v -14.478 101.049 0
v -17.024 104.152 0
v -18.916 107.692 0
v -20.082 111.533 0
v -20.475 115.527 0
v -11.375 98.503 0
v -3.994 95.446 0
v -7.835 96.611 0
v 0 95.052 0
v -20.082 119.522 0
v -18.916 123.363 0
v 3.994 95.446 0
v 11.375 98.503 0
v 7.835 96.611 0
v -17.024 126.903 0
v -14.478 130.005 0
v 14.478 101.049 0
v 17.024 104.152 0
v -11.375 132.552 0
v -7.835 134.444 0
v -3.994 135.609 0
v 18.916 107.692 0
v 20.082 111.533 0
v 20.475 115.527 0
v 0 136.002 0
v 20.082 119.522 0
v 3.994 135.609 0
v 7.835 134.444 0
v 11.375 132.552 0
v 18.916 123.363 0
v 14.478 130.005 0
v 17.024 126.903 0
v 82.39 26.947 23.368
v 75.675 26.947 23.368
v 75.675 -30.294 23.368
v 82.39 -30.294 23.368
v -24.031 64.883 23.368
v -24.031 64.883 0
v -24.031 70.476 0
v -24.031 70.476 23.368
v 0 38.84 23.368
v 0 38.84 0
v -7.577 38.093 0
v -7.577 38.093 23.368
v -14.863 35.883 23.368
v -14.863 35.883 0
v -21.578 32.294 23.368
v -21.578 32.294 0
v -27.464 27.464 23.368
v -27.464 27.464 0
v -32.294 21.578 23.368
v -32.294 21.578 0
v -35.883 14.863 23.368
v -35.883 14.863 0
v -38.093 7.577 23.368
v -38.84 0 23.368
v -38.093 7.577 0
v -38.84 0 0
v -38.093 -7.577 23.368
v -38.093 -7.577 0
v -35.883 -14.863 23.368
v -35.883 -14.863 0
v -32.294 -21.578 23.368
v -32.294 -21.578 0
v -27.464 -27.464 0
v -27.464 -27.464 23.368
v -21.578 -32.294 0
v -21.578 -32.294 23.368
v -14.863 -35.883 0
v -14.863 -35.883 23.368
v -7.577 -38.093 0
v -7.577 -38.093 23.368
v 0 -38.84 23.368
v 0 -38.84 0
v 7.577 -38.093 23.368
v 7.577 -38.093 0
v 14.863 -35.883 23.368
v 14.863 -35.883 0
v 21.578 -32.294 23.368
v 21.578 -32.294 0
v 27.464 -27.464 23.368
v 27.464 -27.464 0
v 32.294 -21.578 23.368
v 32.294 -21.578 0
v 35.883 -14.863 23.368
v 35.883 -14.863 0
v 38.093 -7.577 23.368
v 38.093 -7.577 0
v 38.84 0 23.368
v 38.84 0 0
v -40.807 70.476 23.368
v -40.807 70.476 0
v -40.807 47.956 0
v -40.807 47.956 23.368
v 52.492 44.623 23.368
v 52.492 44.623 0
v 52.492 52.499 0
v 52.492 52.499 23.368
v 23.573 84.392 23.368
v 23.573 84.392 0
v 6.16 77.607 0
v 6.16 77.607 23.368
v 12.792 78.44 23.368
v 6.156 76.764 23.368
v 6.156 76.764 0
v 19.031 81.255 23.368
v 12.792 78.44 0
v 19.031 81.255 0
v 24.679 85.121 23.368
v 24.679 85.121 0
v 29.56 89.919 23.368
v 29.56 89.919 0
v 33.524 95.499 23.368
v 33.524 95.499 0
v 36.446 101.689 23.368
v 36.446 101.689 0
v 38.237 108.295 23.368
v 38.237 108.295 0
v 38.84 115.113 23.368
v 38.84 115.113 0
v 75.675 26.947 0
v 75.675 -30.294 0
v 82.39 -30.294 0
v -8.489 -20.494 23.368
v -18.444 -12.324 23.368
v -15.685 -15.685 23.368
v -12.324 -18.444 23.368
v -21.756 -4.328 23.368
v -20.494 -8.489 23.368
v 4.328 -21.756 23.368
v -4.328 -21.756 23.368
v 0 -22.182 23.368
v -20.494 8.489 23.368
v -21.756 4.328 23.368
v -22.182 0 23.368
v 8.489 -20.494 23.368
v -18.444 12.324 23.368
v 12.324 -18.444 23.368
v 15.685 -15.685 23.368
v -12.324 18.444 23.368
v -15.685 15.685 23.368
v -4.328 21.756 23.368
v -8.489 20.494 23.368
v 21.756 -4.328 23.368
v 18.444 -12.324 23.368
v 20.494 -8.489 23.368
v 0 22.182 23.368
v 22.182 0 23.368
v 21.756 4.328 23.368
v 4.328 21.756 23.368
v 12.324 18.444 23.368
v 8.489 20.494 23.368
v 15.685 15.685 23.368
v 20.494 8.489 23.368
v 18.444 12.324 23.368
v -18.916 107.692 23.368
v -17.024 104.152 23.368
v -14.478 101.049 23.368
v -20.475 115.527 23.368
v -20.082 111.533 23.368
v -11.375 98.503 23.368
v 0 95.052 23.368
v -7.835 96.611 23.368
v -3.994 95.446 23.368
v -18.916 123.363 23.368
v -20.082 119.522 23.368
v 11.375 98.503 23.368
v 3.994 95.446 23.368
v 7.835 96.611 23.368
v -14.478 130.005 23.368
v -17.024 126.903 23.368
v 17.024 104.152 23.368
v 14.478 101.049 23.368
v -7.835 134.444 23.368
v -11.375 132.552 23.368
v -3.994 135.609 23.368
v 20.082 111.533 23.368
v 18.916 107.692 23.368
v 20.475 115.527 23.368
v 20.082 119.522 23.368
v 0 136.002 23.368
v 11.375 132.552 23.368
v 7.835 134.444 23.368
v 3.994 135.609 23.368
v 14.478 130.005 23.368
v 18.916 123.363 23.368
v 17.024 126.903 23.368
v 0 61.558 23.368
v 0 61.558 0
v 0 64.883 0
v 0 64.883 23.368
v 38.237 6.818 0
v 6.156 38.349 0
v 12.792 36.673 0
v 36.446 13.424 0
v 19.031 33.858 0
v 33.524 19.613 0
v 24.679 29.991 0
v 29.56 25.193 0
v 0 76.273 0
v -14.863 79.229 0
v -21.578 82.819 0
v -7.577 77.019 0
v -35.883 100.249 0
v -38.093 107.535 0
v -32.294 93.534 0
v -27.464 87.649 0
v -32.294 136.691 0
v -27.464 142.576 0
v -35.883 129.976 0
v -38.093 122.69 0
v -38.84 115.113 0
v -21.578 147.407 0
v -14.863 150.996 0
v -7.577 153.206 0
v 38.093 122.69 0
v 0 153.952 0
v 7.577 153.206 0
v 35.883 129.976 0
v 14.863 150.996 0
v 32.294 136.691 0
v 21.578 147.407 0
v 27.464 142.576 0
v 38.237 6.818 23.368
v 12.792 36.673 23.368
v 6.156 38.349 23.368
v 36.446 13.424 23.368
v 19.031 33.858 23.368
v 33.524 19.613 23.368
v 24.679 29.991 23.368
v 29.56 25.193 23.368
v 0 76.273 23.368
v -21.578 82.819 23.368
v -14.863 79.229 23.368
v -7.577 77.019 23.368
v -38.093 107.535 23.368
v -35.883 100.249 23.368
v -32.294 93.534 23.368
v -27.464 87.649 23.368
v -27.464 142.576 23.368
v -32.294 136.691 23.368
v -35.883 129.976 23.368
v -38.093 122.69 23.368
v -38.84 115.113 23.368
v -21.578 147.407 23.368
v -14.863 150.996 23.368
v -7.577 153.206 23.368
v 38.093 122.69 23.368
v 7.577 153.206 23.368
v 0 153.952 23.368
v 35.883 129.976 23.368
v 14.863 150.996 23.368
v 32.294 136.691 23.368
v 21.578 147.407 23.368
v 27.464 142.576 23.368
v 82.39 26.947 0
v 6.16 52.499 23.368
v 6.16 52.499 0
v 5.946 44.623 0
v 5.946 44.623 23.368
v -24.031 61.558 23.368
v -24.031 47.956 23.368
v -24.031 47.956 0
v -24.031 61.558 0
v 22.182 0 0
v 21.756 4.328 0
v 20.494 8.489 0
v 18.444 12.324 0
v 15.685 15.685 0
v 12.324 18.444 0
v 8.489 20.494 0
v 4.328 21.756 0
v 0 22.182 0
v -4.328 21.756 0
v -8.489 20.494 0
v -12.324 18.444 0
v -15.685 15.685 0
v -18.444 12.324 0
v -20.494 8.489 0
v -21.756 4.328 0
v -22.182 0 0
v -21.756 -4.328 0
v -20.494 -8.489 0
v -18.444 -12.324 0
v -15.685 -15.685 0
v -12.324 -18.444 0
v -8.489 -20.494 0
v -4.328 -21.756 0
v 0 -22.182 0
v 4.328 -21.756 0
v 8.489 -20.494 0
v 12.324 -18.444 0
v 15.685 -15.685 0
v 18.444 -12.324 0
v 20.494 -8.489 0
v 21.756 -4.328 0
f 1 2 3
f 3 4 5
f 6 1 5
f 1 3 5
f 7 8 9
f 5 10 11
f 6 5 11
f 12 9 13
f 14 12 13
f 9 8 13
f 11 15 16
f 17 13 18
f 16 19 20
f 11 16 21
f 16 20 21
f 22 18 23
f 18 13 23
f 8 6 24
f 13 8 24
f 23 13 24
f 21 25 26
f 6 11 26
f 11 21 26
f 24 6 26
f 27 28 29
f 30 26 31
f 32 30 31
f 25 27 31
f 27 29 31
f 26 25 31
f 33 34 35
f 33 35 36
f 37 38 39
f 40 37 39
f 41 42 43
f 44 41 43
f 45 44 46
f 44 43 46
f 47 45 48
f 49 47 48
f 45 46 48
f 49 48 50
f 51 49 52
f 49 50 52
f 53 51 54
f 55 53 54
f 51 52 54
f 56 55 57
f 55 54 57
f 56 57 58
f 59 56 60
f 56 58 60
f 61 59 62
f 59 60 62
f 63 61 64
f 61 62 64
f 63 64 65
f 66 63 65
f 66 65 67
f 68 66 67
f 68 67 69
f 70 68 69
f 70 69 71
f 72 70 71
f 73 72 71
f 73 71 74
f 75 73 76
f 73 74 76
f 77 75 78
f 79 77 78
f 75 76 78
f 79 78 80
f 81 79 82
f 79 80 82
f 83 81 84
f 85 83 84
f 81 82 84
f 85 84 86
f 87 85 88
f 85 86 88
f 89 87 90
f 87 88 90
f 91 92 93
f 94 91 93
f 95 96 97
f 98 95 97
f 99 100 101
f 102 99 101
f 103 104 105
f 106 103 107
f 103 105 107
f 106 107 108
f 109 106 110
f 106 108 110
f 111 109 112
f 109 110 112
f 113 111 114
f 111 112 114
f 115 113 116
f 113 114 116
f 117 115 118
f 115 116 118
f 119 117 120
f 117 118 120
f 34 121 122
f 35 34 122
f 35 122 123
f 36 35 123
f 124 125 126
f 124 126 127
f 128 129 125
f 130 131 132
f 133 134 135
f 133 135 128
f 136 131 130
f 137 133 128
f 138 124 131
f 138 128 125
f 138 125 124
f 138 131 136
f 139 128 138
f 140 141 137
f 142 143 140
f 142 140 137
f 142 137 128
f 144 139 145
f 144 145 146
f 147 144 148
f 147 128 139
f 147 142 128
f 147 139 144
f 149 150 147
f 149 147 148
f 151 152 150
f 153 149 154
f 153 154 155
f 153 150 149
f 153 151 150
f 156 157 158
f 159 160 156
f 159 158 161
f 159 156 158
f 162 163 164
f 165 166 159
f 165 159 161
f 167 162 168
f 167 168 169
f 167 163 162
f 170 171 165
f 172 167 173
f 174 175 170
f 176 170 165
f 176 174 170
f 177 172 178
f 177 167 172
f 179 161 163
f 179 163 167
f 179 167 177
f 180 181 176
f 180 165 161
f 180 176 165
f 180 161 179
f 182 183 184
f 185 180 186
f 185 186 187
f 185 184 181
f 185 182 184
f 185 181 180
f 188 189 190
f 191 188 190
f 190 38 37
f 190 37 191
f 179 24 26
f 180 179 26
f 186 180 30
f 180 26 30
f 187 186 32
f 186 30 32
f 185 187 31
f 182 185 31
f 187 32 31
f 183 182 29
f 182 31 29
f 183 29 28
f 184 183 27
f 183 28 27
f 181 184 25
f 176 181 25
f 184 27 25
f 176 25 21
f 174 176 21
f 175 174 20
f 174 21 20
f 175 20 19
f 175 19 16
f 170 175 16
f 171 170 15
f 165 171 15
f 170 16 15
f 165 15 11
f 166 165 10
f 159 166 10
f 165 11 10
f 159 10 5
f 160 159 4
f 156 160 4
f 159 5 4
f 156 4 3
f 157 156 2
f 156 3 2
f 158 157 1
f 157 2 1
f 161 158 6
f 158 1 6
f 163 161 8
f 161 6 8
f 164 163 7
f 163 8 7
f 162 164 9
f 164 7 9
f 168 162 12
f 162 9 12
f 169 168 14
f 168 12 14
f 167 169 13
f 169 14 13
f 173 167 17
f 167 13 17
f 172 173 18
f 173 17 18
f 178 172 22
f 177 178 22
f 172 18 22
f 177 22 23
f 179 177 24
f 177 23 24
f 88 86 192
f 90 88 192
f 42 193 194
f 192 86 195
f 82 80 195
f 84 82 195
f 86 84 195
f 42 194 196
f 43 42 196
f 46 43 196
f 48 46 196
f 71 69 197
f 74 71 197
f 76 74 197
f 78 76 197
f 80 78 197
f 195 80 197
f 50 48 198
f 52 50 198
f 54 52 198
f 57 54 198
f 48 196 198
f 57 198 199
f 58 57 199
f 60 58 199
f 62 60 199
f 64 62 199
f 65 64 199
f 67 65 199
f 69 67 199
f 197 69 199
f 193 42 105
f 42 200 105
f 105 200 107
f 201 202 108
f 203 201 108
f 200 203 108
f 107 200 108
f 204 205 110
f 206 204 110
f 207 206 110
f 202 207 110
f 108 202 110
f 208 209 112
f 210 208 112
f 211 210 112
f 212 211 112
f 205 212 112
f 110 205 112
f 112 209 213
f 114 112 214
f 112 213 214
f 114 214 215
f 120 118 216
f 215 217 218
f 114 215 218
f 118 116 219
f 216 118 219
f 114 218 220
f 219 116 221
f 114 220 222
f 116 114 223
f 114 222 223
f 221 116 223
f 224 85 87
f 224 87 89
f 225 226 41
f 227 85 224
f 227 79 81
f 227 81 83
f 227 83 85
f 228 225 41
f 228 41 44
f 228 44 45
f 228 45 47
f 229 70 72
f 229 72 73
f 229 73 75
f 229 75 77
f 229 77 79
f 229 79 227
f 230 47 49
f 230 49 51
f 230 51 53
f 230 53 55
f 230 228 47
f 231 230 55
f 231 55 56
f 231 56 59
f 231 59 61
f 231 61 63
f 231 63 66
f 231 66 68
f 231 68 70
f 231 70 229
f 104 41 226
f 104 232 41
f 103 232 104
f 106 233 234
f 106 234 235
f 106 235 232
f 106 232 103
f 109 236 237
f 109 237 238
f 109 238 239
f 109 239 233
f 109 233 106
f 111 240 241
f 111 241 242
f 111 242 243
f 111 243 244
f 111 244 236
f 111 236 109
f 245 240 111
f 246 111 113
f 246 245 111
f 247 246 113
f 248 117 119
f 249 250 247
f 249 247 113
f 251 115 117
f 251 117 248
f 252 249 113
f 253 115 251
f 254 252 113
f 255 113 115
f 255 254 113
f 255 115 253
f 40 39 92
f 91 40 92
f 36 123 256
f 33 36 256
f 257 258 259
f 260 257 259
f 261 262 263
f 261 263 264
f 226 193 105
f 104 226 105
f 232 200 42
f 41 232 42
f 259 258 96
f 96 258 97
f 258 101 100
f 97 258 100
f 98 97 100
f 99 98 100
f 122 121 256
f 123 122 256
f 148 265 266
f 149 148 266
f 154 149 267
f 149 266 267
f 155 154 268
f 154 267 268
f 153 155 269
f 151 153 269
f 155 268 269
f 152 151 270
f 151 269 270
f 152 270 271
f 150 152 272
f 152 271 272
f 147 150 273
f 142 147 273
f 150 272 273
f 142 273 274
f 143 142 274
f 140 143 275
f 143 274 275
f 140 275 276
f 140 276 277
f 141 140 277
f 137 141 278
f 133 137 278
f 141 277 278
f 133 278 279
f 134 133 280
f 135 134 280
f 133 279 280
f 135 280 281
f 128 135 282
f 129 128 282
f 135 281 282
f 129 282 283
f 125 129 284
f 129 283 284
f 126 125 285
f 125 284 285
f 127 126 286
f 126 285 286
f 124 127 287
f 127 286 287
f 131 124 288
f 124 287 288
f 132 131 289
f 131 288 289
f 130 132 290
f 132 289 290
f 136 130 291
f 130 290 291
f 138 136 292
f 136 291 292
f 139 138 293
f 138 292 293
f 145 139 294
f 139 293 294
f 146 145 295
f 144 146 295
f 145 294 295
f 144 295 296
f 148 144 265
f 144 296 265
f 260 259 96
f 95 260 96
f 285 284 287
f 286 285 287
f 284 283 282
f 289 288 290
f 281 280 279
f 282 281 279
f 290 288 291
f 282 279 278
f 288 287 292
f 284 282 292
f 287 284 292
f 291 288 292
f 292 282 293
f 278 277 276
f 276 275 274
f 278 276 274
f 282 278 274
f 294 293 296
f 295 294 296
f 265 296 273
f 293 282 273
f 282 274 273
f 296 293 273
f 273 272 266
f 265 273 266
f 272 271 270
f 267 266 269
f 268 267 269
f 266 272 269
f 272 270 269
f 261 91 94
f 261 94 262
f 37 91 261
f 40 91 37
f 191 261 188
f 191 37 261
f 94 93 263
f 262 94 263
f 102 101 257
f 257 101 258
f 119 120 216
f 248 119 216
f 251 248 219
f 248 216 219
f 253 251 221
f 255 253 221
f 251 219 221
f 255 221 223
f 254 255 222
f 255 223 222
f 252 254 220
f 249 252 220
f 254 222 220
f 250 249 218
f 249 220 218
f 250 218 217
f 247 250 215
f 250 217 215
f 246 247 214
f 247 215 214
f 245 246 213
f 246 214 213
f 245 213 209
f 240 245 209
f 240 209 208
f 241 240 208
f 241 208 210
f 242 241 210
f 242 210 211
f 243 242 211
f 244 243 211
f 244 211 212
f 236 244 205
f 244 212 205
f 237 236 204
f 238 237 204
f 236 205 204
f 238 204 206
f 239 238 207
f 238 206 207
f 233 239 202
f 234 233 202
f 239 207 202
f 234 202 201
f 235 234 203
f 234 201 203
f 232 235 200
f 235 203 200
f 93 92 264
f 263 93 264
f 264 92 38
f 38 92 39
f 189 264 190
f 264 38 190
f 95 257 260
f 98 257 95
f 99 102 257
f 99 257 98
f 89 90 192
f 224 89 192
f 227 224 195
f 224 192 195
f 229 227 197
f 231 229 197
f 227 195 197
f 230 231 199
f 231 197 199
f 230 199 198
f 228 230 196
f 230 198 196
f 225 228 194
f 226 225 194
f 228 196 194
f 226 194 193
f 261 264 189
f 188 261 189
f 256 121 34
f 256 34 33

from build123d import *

# Parameters (mm, degrees)
F2_DEPTH = 23.368
F1_R     = 22.1823708078
F1_W     = 6.7154541612
F1_H     = 26.9472375512
F1_H_2   = 30.2940346301
F1_R_2   = 20.4749954706
F1_W_2   = 24.0313000977
F1_H_3   = 3.3249892294


with BuildPart() as f2:
    # F1 (on face) → F2 (new body)
    with BuildSketch(Plane.XY):
        Polygon((6.1597758904, 77.6072144508), (6.1597758904, 52.4990707636), (52.492197603, 52.4990707636), (23.5728248954, 84.3919739127), align=None)
        Polygon((52.492197603, 52.4990707636), (6.1597758904, 52.4990707636), (5.9456601739, 44.6233153343), (52.492197603, 44.6233153343), align=None)
    extrude(amount=F2_DEPTH)


with BuildPart() as f2b:
    # F1 (on face) → F2, piece 2 (new body)
    with BuildSketch(Plane.XY):
        Circle(F1_R)
    extrude(amount=F2_DEPTH)


with BuildPart() as f2c:
    # F1 (on face) → F2, piece 3 (new body)
    with BuildSketch(Plane.XY):
        with Locations((79.0323130786, 13.4736187756)):
            Rectangle(F1_W, F1_H)
        with Locations((79.0323130786, -15.147017315)):
            Rectangle(F1_W, F1_H_2)
    extrude(amount=F2_DEPTH)


with BuildPart() as f2d:
    # F1 (on face) → F2, piece 4 (new body)
    with BuildSketch(Plane.XY):
        with Locations((0, 115.5273094773)):
            Circle(F1_R_2)
    extrude(amount=F2_DEPTH)


with BuildPart() as f2e:
    # F1 (on face) → F2, piece 5 (new body)
    with BuildSketch(Plane.XY):
        with Locations((-12.0156500489, 63.2209833711)):
            Rectangle(F1_W_2, F1_H_3)
        Polygon((-24.0313000977, 61.5584887564), (-24.0313000977, 64.8834779859), (-24.0313000977, 70.4755038023), (-40.8073812723, 70.4755038023), (-40.8073812723, 47.9562617838), (-24.0313000977, 47.9562617838), align=None)
    extrude(amount=F2_DEPTH)


with BuildPart() as f2f:
    # F0 (on Top) → F2, piece 6 (new body)
    with BuildSketch(Plane.XY):
        with BuildLine():
            ThreePointArc((0, 38.839658283), (3.0877584582, 38.71672511), (6.1559705064, 38.3487037938))
            Line((6.1559705064, 38.3487037938), (6.1559705064, 57.5563162565))
            Line((6.1559705064, 57.5563162565), (0, 57.5563162565))
            Line((0, 57.5563162565), (0, 38.839658283))
        make_face()
        with BuildLine():
            Line((0, 57.5563162565), (6.1559705064, 57.5563162565))
            Line((6.1559705064, 57.5563162565), (6.1559705064, 76.7639287192))
            ThreePointArc((6.1559705064, 76.7639287192), (3.0877584582, 76.395907403), (0, 76.27297423))
            Line((0, 76.27297423), (0, 57.5563162565))
        make_face()
        with BuildLine():
            ThreePointArc((0, 76.27297423), (3.0877584582, 76.395907403), (6.1559705064, 76.7639287192))
            ThreePointArc((6.1559705064, 76.7639287192), (29.5602338151, 89.9191485869), (38.839658283, 115.112632513))
            ThreePointArc((38.839658283, 115.112632513), (-27.4637857509, 142.5764182639), (0, 76.27297423))
        make_face()
        with BuildLine():
            ThreePointArc((0, 38.839658283), (-27.4637857509, -27.4637857509), (38.839658283, 0))
            ThreePointArc((38.839658283, 0), (29.5602338151, 25.1934839261), (6.1559705064, 38.3487037938))
            ThreePointArc((6.1559705064, 38.3487037938), (3.0877584582, 38.71672511), (0, 38.839658283))
        make_face()
    extrude(amount=F2_DEPTH)


solid = Compound([f2.part, f2b.part, f2c.part, f2d.part, f2e.part, f2f.part])
